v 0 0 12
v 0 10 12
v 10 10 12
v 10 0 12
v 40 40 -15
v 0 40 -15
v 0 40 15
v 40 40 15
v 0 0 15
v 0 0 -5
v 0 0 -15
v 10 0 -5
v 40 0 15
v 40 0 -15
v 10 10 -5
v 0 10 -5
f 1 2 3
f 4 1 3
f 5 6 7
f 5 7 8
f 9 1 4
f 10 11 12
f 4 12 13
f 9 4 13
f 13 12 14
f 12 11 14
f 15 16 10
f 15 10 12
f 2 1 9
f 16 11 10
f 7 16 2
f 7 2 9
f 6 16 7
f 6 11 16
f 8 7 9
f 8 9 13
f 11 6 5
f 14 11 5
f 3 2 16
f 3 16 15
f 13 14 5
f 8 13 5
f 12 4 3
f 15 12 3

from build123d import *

# Parameters (mm, degrees)
BOSS_EXTRUDE1_DEPTH      = 15
BOSS_EXTRUDE1_DEPTH_BACK = 15
SKETCH1_W                = 40
SKETCH1_H                = 40
CUT_EXTRUDE1_DEPTH       = 12
CUT_EXTRUDE1_DEPTH_BACK  = 5
SKETCH2_W                = 10
SKETCH2_H                = 10


with BuildPart() as part:
    # Sketch1 → Boss-Extrude1 (new, two sides: drawn at the far end of the back side and taken through both)
    with BuildSketch(Plane.XY.offset(-BOSS_EXTRUDE1_DEPTH_BACK)):
        with Locations((20, 20)):
            Rectangle(SKETCH1_W, SKETCH1_H)
    extrude(amount=BOSS_EXTRUDE1_DEPTH + BOSS_EXTRUDE1_DEPTH_BACK)

    # Sketch2 → Cut-Extrude1 (cut, two sides: drawn at the far end of the back side and taken through both)
    with BuildSketch(Plane.XY.offset(-CUT_EXTRUDE1_DEPTH_BACK)):
        with Locations((5, 5)):
            Rectangle(SKETCH2_W, SKETCH2_H)
    extrude(amount=CUT_EXTRUDE1_DEPTH + CUT_EXTRUDE1_DEPTH_BACK, mode=Mode.SUBTRACT)


solid = part.part
